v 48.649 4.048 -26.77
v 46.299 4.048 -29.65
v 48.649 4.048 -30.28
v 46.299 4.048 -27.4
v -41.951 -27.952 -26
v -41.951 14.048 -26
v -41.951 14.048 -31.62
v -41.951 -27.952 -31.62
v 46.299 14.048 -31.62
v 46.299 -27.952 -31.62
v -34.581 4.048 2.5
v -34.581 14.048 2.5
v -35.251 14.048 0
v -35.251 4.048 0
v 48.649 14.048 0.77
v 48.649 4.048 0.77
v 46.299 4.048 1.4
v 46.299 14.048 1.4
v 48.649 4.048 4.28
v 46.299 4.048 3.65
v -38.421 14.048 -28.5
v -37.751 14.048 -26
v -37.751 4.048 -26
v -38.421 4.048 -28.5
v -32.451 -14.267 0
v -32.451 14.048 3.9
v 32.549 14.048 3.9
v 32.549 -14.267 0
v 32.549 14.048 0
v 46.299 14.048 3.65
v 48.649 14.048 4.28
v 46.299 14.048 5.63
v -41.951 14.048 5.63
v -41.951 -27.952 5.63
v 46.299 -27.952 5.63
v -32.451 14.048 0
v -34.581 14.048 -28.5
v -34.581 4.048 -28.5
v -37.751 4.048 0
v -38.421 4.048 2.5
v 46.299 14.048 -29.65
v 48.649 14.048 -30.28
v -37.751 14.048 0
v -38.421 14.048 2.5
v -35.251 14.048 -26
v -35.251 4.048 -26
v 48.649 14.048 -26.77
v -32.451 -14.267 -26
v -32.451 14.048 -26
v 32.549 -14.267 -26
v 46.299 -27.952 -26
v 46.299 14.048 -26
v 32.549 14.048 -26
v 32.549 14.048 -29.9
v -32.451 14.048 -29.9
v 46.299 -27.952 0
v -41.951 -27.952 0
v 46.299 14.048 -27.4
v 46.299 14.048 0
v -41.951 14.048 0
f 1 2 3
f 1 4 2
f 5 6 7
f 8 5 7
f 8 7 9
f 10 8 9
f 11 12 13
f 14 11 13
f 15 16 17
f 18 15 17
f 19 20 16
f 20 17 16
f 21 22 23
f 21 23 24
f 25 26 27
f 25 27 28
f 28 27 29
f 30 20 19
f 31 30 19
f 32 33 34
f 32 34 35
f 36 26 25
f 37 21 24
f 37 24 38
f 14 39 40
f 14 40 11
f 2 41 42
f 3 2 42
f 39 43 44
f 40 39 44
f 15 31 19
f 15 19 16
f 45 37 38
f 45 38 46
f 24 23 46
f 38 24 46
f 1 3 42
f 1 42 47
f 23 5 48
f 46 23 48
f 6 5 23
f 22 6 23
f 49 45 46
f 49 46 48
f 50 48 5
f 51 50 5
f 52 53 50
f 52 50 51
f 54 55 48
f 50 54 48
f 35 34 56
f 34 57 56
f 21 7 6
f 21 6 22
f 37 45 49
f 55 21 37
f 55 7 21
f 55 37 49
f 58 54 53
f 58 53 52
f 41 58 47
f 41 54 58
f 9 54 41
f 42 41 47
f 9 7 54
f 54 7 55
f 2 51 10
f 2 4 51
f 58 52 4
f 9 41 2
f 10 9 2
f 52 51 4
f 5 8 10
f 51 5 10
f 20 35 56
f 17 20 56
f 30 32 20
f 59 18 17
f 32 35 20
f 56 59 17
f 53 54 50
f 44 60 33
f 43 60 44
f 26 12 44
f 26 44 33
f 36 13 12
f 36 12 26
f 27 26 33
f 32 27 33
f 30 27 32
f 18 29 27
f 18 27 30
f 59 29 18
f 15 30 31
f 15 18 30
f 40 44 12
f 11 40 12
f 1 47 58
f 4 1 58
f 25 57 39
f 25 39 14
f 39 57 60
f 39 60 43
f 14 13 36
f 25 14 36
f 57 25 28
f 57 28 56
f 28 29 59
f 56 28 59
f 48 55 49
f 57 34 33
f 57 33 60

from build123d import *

# Parameters (mm, degrees)
SKETCH1_W               = 88.25
SKETCH1_H               = 42
BOSS_EXTRUDE1_DEPTH     = 5
CUT_EXTRUDE1_DEPTH      = 1
CUT_EXTRUDE1_DEPTH_BACK = 10
BOSS_EXTRUDE2_DEPTH     = 10
CUT_EXTRUDE2_DEPTH      = 65
SKETCH7_W               = 88.25
SKETCH7_H               = 0.63
SKETCH7_H_2             = 0.620319398
BOSS_EXTRUDE3_DEPTH     = 42


with BuildPart() as part:
    # Sketch1 → Boss-Extrude1 (new body)
    with BuildSketch(Plane.XY):
        with Locations((2.173974505, -6.951707737)):
            Rectangle(SKETCH1_W, SKETCH1_H)
    extrude(amount=BOSS_EXTRUDE1_DEPTH)

    # Sketch2 → Cut-Extrude1 (cut, two sides)
    with BuildSketch(Plane(origin=(0, 14.048292263, 0), x_dir=(1, 0, 0), z_dir=(0, 1, 0))) as cut_extrude1_sk:
        Polygon((-35.251025495, 0), (-37.751025495, 0), (-38.420898476, -2.5), (-34.581152514, -2.5), align=None)
    extrude(amount=CUT_EXTRUDE1_DEPTH, mode=Mode.SUBTRACT)
    extrude(cut_extrude1_sk.sketch, amount=-CUT_EXTRUDE1_DEPTH_BACK, mode=Mode.SUBTRACT)

    # Sketch3 → Boss-Extrude2 (add)
    with BuildSketch(Plane(origin=(0, 14.048292263, 0), x_dir=(1, 0, 0), z_dir=(0, 1, 0))):
        Polygon((46.298974505, -3.65), (48.648974505, -4.279680602), (48.648974505, -0.770319398), (46.298974505, -1.4), align=None)
    extrude(amount=-BOSS_EXTRUDE2_DEPTH)

    # Sketch6 → Cut-Extrude2 (cut)
    with BuildSketch(Plane.ZY.offset(32.451025495)):
        Polygon((-0.05, -14.629560467), (0, 14.048292263), (3.9, 14.048292263), align=None)
    extrude(amount=-CUT_EXTRUDE2_DEPTH, mode=Mode.SUBTRACT)


with BuildPart() as body_2:
    # Mirror3: mirrored copy
    add(part.part.mirror(Plane(origin=(0, 0, -13), x_dir=(1, 0, 0), z_dir=(0, 0, -1))))


with BuildPart() as part_1:
    add(part.part)

    add(body_2.part)  # Boss-Extrude3 merges body 2
    # Sketch7 → Boss-Extrude3 (add)
    with BuildSketch(Plane(origin=(0, 14.048292263, 0), x_dir=(1, 0, 0), z_dir=(0, 1, 0))):
        with Locations((2.173974505, -5.315)):
            Rectangle(SKETCH7_W, SKETCH7_H)
        with Locations((2.173974505, 31.310159699)):
            Rectangle(SKETCH7_W, SKETCH7_H_2)
    extrude(amount=-BOSS_EXTRUDE3_DEPTH)


solid = part_1.part
